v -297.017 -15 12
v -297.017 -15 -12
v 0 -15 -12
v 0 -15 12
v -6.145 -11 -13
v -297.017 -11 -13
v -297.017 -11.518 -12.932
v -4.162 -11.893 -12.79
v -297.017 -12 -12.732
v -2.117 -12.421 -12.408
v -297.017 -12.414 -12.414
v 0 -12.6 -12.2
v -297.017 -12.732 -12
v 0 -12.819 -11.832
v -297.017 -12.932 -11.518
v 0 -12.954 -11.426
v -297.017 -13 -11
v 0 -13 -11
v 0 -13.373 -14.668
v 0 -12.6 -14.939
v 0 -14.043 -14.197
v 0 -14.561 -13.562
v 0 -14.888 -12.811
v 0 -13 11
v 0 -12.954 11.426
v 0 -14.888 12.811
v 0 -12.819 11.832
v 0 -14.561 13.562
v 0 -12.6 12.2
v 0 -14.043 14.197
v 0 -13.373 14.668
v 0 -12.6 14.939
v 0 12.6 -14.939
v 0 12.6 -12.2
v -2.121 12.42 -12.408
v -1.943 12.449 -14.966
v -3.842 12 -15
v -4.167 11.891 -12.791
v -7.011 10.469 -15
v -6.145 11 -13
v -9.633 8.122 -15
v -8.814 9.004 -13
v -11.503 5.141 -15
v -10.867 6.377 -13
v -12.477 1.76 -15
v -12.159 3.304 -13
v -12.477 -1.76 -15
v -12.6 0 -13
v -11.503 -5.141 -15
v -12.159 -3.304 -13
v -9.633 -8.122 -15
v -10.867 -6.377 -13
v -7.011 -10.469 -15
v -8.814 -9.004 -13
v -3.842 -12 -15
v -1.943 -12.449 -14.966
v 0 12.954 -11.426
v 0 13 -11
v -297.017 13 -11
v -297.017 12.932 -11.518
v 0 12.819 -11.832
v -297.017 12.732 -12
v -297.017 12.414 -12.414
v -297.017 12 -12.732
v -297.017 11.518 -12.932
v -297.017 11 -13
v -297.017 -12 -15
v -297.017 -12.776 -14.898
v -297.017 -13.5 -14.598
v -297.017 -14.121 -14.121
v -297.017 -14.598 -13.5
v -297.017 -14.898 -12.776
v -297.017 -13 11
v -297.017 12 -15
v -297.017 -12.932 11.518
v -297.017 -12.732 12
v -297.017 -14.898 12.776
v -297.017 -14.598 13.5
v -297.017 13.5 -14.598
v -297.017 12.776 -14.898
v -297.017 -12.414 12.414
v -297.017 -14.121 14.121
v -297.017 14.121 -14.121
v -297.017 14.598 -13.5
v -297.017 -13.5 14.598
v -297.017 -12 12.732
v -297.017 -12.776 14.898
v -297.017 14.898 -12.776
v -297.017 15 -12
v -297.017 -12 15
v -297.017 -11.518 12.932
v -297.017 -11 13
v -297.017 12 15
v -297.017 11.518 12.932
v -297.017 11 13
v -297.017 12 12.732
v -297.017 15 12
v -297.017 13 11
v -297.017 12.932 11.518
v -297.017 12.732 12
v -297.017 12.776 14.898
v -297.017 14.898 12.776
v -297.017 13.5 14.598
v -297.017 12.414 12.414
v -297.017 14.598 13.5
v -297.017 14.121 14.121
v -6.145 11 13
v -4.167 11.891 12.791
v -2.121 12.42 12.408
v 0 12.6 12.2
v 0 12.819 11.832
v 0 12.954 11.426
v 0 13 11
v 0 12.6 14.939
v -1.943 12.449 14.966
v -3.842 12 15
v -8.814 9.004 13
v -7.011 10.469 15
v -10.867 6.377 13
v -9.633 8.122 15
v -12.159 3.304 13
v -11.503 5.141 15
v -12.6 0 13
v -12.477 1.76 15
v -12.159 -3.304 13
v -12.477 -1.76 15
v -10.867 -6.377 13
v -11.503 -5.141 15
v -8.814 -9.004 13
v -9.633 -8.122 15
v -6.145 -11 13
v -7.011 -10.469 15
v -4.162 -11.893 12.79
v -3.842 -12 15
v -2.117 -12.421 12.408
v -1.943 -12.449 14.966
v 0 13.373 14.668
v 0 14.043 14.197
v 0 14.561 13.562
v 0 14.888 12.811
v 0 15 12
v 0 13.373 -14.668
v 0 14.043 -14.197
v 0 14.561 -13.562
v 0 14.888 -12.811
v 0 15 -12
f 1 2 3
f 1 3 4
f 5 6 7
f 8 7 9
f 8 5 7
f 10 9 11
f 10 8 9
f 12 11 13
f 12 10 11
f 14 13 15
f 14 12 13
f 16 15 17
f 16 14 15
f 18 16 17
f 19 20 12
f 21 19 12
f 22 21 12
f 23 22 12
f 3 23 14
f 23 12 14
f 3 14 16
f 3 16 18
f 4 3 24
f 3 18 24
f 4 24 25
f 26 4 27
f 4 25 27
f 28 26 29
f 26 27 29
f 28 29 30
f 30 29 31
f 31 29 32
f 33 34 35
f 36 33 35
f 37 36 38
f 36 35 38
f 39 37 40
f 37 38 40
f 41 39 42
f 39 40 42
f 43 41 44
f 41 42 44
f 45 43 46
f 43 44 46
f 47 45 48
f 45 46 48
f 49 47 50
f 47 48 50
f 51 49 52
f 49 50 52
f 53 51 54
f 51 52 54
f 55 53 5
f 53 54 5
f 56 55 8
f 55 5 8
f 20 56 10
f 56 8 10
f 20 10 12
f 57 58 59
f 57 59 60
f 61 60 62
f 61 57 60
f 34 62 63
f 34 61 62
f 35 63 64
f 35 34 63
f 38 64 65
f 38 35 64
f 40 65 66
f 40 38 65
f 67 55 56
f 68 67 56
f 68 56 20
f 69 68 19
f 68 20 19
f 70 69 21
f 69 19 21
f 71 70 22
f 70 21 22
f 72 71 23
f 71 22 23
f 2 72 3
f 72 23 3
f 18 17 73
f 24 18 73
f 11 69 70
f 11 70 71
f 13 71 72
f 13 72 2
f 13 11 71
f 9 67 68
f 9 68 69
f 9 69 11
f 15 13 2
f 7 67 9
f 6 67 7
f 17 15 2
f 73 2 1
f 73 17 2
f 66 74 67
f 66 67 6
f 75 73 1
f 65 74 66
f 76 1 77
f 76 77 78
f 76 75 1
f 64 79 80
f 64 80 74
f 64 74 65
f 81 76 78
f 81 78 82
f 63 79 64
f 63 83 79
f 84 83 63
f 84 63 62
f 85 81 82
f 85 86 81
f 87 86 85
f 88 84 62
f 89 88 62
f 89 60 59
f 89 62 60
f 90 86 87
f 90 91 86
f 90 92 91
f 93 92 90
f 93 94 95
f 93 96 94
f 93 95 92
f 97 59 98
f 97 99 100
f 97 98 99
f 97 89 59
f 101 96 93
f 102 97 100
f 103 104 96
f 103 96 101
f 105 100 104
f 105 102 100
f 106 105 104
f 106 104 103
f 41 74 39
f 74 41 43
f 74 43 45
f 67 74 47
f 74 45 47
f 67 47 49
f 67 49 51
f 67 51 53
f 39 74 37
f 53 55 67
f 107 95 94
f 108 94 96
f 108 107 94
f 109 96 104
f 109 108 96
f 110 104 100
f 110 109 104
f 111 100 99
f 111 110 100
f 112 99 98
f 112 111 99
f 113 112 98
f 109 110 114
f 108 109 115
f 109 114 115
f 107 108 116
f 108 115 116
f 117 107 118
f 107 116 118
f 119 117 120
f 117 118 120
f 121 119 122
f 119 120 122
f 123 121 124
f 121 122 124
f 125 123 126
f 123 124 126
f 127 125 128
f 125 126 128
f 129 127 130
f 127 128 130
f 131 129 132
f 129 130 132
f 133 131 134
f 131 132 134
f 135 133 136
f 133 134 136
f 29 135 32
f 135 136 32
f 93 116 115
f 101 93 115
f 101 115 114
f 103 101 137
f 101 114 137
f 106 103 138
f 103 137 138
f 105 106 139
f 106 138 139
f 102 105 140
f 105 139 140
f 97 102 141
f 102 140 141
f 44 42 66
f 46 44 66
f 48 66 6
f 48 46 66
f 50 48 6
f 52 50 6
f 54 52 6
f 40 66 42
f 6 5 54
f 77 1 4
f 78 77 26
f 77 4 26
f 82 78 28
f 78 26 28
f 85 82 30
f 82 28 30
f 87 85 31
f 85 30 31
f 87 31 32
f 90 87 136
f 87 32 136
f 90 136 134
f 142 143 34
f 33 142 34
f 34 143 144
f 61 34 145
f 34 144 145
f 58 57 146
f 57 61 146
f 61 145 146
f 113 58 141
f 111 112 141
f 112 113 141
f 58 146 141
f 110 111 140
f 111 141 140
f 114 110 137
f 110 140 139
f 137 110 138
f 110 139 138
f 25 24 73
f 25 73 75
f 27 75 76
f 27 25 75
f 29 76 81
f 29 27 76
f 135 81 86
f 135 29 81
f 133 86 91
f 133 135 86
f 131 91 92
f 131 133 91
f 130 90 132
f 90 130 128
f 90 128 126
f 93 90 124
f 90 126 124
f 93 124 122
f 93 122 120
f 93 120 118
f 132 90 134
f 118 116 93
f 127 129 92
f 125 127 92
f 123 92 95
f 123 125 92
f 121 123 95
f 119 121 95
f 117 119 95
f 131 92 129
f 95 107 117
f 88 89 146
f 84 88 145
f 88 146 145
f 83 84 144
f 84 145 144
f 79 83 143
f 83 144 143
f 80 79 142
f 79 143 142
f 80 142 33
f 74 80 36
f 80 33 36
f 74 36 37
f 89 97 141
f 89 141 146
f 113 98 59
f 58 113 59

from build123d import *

# Parameters (mm, degrees)
EXTRUDE_1_DEPTH     = 297.016771
SKETCH_2_R          = 12.6
CUT_EXTRUDE_1_DEPTH = 31


with BuildPart() as part:
    # Эскиз1 → Бобышка-Вытянуть1 (new body)
    with BuildSketch(Plane(origin=(0, 0, 0), x_dir=(0, 0, -1), z_dir=(1, 0, 0))):
        with BuildLine():
            Line((-12, 15), (12, 15))
            ThreePointArc((12, 15), (14.121320344, 14.121320344), (15, 12))
            Line((15, 12), (15, -12))
            ThreePointArc((15, -12), (14.121320344, -14.121320344), (12, -15))
            Line((12, -15), (-12, -15))
            ThreePointArc((-12, -15), (-14.121320344, -14.121320344), (-15, -12))
            Line((-15, -12), (-15, 12))
            ThreePointArc((-15, 12), (-14.121320344, 14.121320344), (-12, 15))
        make_face()
        with BuildLine():
            Line((-11, 13), (11, 13))
            ThreePointArc((11, 13), (12.414213562, 12.414213562), (13, 11))
            Line((13, 11), (13, -11))
            ThreePointArc((13, -11), (12.414213562, -12.414213562), (11, -13))
            Line((11, -13), (-11, -13))
            ThreePointArc((-11, -13), (-12.414213562, -12.414213562), (-13, -11))
            Line((-13, -11), (-13, 11))
            ThreePointArc((-13, 11), (-12.414213562, 12.414213562), (-11, 13))
        make_face(mode=Mode.SUBTRACT)
    extrude(amount=-EXTRUDE_1_DEPTH)

    # Эскиз2 → Вырез-Вытянуть1 (cut, through all)
    with BuildSketch(Plane.XY.offset(15)):
        Circle(SKETCH_2_R)
    extrude(amount=-CUT_EXTRUDE_1_DEPTH, mode=Mode.SUBTRACT)


solid = part.part
